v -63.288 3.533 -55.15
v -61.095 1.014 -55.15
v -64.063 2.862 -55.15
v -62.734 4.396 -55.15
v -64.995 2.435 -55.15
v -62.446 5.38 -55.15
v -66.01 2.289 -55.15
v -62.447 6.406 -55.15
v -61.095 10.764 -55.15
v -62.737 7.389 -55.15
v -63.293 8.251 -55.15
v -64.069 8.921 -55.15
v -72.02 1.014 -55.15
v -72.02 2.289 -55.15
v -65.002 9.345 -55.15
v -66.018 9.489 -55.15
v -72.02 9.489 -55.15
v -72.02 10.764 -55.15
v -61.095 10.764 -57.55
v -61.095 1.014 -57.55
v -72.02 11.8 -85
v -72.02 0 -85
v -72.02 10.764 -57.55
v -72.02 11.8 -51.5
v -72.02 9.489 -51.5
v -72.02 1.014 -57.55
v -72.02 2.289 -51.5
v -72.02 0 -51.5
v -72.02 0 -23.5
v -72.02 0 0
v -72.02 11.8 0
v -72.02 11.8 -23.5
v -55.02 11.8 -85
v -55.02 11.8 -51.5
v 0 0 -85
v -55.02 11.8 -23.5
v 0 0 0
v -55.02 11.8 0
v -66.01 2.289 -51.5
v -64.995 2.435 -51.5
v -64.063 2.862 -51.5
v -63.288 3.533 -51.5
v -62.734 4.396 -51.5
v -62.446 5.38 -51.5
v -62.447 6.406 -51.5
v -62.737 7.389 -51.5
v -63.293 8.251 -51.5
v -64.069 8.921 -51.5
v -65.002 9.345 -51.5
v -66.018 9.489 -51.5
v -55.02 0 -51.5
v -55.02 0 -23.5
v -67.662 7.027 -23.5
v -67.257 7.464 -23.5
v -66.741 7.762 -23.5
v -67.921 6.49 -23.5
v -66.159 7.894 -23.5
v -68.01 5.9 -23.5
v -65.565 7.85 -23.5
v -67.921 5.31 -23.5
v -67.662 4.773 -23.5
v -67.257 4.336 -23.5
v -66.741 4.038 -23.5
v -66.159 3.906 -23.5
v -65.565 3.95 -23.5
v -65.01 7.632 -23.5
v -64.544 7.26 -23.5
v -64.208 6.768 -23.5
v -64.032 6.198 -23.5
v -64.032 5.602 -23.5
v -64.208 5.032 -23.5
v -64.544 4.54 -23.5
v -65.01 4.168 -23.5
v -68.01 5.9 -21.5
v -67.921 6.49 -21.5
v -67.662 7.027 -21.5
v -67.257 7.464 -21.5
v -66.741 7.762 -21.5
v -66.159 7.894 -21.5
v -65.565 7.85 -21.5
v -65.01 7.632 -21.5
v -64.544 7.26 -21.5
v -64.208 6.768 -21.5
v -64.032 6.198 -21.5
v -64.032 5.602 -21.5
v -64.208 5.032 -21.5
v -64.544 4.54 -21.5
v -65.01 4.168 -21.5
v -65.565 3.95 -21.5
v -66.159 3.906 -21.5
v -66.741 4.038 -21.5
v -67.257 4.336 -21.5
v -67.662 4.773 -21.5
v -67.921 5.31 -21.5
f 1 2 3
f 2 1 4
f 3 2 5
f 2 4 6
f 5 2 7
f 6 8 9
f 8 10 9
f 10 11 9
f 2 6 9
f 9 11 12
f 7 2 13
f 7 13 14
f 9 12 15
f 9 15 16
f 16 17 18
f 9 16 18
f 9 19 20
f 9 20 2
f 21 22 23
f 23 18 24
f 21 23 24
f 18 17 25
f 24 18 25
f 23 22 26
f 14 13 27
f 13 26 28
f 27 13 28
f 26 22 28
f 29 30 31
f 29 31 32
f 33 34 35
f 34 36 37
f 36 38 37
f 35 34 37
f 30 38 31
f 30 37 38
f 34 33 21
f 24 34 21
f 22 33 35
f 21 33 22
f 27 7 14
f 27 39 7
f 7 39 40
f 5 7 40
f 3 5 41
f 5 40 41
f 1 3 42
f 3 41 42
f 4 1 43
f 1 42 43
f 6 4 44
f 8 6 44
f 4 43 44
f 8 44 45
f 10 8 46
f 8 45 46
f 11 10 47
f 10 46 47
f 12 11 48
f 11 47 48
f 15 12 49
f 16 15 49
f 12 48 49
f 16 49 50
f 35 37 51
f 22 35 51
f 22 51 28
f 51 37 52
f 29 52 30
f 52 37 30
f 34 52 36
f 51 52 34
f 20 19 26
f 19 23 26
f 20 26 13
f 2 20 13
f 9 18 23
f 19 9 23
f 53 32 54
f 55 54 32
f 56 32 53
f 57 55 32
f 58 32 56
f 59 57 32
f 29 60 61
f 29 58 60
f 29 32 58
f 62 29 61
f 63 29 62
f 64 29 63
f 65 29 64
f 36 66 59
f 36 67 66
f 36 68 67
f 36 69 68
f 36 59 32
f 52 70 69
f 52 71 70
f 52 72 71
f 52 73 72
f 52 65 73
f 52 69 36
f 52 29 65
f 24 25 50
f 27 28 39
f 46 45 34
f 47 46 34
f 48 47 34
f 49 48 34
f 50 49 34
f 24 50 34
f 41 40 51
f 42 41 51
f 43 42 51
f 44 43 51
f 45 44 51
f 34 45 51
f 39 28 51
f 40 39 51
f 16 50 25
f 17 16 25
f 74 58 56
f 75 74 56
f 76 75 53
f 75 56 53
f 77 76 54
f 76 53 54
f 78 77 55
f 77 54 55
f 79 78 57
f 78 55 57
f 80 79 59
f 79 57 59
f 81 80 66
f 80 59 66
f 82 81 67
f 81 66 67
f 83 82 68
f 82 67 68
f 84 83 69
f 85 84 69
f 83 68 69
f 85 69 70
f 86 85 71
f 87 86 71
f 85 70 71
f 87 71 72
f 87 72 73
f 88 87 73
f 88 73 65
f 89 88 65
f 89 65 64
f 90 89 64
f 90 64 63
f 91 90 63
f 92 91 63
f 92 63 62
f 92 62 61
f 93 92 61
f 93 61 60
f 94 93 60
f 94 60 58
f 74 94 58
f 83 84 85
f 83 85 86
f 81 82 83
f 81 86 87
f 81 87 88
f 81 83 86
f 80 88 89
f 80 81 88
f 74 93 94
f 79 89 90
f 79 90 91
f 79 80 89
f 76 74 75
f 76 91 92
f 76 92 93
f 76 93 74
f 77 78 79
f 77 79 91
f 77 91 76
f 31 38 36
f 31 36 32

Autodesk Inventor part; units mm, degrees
ref_plane "YZ Plane" through (0, 0, 0) normal (1, 0, 0) x (0, 1, 0)
ref_plane "XZ Plane" through (0, 0, 0) normal (0, 1, 0) x (-1, 0, 0)
ref_plane "XY Plane" through (0, 0, 0) normal (0, 0, 1) x (1, 0, 0)
sketch "Sketch1" plane through (0, 0, 0) normal (0, 1, 0) x (-1, 0, 0)
  line L0 (0, 0) -> (60, 0)
  line L1 (55.02, -23.5) -> (55.02, -51.5)
  line L2 (60, -75) -> (0, -75)
  line L3 (0, -75) -> (0, 0)
  line L4 (55.02, -23.5) -> (72.02, -23.5) construction
  line L5 (72.02, -23.5) -> (72.02, -51.5) construction
  line L6 (72.02, -51.5) -> (55.02, -51.5) construction
  line L7 (55.02, -51.5) -> (55.02, -23.5)
  line L8 (72.02, -51.5) -> (55.02, -51.5)
  line L9 (60, -75) -> (72.02, -75)
  line L10 (72.02, -75) -> (72.02, -51.5)
  line L11 (72.02, -23.5) -> (55.02, -23.5)
  line L12 (60, 0) -> (72.02, 0)
  line L13 (72.02, 0) -> (72.02, -23.5)
  point P0 (55.02, -37.5)
  point P1 (63.52, -51.5)
  point P2 (63.52, -51.5)
  dimension "d2" = 28
  dimension "d25" = 8.5
  dimension "d26" = 60
  dimension "d27" = 12.02
  dimension "d28" = 72.02
extrude "Extrusion1" add sketch "Sketch1" along normal blind 11.8
sketch "Sketch2" plane through (-55.02, 0, -23.5) normal (0, 0, -1) x (-1, 0, 0)
  circle A0 centre (10.99, 5.9) radius 2
  line L0 (17, 0) -> (17, 11.8) projected
  point P0 (-55.02, 0)
  dimension "d6" = 4
  dimension "d7" = 6.01
extrude "Extrusion2" cut sketch "Sketch2" against normal blind 2
sketch "Sketch3" plane through (-72.02, 0, -51.5) normal (0, 0, 1) x (1, 0, 0)
  arc A0 (6.01, 2.2893) -> (6.0025, 9.4893) centre (6.01, 5.8893) ccw
  line L0 (0, 0) -> (0, 11.8) projected
  line L1 (6.01, 5.8893) -> (0, 5.9) construction
  line L2 (6.0025, 9.4893) -> (0, 9.4893)
  line L3 (6.01, 2.2893) -> (0, 2.2893)
  point P0 (72.02, 0)
  point P1 (0, 9.1893)
  point P2 (0, 2.5893)
  dimension "d10" = 7.2
  dimension "d21" = 6.01
extrude "Extrusion3" cut sketch "Sketch3" against normal blind 3.65
sketch "Sketch4" plane through (-72.02, 0, -75) normal (-1, 0, 0) x (0, 0, 1)
  line L0 (19.85, 10.7643) -> (17.45, 10.7643)
  line L1 (17.45, 10.7643) -> (17.45, 1.0143)
  line L2 (17.45, 1.0143) -> (19.85, 1.0143)
  line L3 (19.85, 1.0143) -> (19.85, 10.7643)
  line L4 (19.85, 2.2893) -> (19.85, 9.4893) projected
  point P0 (75, 0)
  point P1 (19.85, 5.8893)
  point P2 (19.85, 2.5893)
  point P3 (19.85, 9.1893)
  dimension "d13" = 2.4
  dimension "d14" = 9.75
extrude "Extrusion4" cut sketch "Sketch4" against normal blind 10.925
sketch "Sketch5" plane through (-72.02, 0, 0) normal (0, 0, 1) x (1, 0, 0)
  line L0 (17, 0) -> (17, 11.8) projected
  line L1 (72.02, 11.8) -> (0, 11.8) projected
  line L2 (0, 0) -> (72.02, 0) projected
  line L3 (17, 11.8) -> (72.02, 0)
  line L4 (72.02, 0) -> (72.02, 11.8)
  line L5 (17, 11.8) -> (72.02, 11.8)
extrude "Extrusion5" cut sketch "Sketch5" against normal blind 88.5 contours L1 L4 L3
sketch "Sketch6" plane through (-72.02, 0, -75) normal (0, 0, -1) x (-1, 0, 0)
  line L0 (0, 11.8) -> (-17, 11.8)
  line L1 (-17, 11.8) -> (-72.02, 0)
  line L2 (0, 0) -> (-72.02, 0) projected
  line L3 (-72.02, 0) -> (0, 0)
  line L4 (0, 11.8) -> (-17, 11.8) projected
  line L5 (0, 0) -> (0, 11.8)
  line L6 (-17, 0) -> (-17, 11.8) projected
  line L7 (0, 11.8) -> (-17, 11.8)
  line L8 (-17, 11.8) -> (-72.02, 0)
extrude "Extrusion6" add sketch "Sketch6" along normal blind 10
properties part number "hand_left_1"
